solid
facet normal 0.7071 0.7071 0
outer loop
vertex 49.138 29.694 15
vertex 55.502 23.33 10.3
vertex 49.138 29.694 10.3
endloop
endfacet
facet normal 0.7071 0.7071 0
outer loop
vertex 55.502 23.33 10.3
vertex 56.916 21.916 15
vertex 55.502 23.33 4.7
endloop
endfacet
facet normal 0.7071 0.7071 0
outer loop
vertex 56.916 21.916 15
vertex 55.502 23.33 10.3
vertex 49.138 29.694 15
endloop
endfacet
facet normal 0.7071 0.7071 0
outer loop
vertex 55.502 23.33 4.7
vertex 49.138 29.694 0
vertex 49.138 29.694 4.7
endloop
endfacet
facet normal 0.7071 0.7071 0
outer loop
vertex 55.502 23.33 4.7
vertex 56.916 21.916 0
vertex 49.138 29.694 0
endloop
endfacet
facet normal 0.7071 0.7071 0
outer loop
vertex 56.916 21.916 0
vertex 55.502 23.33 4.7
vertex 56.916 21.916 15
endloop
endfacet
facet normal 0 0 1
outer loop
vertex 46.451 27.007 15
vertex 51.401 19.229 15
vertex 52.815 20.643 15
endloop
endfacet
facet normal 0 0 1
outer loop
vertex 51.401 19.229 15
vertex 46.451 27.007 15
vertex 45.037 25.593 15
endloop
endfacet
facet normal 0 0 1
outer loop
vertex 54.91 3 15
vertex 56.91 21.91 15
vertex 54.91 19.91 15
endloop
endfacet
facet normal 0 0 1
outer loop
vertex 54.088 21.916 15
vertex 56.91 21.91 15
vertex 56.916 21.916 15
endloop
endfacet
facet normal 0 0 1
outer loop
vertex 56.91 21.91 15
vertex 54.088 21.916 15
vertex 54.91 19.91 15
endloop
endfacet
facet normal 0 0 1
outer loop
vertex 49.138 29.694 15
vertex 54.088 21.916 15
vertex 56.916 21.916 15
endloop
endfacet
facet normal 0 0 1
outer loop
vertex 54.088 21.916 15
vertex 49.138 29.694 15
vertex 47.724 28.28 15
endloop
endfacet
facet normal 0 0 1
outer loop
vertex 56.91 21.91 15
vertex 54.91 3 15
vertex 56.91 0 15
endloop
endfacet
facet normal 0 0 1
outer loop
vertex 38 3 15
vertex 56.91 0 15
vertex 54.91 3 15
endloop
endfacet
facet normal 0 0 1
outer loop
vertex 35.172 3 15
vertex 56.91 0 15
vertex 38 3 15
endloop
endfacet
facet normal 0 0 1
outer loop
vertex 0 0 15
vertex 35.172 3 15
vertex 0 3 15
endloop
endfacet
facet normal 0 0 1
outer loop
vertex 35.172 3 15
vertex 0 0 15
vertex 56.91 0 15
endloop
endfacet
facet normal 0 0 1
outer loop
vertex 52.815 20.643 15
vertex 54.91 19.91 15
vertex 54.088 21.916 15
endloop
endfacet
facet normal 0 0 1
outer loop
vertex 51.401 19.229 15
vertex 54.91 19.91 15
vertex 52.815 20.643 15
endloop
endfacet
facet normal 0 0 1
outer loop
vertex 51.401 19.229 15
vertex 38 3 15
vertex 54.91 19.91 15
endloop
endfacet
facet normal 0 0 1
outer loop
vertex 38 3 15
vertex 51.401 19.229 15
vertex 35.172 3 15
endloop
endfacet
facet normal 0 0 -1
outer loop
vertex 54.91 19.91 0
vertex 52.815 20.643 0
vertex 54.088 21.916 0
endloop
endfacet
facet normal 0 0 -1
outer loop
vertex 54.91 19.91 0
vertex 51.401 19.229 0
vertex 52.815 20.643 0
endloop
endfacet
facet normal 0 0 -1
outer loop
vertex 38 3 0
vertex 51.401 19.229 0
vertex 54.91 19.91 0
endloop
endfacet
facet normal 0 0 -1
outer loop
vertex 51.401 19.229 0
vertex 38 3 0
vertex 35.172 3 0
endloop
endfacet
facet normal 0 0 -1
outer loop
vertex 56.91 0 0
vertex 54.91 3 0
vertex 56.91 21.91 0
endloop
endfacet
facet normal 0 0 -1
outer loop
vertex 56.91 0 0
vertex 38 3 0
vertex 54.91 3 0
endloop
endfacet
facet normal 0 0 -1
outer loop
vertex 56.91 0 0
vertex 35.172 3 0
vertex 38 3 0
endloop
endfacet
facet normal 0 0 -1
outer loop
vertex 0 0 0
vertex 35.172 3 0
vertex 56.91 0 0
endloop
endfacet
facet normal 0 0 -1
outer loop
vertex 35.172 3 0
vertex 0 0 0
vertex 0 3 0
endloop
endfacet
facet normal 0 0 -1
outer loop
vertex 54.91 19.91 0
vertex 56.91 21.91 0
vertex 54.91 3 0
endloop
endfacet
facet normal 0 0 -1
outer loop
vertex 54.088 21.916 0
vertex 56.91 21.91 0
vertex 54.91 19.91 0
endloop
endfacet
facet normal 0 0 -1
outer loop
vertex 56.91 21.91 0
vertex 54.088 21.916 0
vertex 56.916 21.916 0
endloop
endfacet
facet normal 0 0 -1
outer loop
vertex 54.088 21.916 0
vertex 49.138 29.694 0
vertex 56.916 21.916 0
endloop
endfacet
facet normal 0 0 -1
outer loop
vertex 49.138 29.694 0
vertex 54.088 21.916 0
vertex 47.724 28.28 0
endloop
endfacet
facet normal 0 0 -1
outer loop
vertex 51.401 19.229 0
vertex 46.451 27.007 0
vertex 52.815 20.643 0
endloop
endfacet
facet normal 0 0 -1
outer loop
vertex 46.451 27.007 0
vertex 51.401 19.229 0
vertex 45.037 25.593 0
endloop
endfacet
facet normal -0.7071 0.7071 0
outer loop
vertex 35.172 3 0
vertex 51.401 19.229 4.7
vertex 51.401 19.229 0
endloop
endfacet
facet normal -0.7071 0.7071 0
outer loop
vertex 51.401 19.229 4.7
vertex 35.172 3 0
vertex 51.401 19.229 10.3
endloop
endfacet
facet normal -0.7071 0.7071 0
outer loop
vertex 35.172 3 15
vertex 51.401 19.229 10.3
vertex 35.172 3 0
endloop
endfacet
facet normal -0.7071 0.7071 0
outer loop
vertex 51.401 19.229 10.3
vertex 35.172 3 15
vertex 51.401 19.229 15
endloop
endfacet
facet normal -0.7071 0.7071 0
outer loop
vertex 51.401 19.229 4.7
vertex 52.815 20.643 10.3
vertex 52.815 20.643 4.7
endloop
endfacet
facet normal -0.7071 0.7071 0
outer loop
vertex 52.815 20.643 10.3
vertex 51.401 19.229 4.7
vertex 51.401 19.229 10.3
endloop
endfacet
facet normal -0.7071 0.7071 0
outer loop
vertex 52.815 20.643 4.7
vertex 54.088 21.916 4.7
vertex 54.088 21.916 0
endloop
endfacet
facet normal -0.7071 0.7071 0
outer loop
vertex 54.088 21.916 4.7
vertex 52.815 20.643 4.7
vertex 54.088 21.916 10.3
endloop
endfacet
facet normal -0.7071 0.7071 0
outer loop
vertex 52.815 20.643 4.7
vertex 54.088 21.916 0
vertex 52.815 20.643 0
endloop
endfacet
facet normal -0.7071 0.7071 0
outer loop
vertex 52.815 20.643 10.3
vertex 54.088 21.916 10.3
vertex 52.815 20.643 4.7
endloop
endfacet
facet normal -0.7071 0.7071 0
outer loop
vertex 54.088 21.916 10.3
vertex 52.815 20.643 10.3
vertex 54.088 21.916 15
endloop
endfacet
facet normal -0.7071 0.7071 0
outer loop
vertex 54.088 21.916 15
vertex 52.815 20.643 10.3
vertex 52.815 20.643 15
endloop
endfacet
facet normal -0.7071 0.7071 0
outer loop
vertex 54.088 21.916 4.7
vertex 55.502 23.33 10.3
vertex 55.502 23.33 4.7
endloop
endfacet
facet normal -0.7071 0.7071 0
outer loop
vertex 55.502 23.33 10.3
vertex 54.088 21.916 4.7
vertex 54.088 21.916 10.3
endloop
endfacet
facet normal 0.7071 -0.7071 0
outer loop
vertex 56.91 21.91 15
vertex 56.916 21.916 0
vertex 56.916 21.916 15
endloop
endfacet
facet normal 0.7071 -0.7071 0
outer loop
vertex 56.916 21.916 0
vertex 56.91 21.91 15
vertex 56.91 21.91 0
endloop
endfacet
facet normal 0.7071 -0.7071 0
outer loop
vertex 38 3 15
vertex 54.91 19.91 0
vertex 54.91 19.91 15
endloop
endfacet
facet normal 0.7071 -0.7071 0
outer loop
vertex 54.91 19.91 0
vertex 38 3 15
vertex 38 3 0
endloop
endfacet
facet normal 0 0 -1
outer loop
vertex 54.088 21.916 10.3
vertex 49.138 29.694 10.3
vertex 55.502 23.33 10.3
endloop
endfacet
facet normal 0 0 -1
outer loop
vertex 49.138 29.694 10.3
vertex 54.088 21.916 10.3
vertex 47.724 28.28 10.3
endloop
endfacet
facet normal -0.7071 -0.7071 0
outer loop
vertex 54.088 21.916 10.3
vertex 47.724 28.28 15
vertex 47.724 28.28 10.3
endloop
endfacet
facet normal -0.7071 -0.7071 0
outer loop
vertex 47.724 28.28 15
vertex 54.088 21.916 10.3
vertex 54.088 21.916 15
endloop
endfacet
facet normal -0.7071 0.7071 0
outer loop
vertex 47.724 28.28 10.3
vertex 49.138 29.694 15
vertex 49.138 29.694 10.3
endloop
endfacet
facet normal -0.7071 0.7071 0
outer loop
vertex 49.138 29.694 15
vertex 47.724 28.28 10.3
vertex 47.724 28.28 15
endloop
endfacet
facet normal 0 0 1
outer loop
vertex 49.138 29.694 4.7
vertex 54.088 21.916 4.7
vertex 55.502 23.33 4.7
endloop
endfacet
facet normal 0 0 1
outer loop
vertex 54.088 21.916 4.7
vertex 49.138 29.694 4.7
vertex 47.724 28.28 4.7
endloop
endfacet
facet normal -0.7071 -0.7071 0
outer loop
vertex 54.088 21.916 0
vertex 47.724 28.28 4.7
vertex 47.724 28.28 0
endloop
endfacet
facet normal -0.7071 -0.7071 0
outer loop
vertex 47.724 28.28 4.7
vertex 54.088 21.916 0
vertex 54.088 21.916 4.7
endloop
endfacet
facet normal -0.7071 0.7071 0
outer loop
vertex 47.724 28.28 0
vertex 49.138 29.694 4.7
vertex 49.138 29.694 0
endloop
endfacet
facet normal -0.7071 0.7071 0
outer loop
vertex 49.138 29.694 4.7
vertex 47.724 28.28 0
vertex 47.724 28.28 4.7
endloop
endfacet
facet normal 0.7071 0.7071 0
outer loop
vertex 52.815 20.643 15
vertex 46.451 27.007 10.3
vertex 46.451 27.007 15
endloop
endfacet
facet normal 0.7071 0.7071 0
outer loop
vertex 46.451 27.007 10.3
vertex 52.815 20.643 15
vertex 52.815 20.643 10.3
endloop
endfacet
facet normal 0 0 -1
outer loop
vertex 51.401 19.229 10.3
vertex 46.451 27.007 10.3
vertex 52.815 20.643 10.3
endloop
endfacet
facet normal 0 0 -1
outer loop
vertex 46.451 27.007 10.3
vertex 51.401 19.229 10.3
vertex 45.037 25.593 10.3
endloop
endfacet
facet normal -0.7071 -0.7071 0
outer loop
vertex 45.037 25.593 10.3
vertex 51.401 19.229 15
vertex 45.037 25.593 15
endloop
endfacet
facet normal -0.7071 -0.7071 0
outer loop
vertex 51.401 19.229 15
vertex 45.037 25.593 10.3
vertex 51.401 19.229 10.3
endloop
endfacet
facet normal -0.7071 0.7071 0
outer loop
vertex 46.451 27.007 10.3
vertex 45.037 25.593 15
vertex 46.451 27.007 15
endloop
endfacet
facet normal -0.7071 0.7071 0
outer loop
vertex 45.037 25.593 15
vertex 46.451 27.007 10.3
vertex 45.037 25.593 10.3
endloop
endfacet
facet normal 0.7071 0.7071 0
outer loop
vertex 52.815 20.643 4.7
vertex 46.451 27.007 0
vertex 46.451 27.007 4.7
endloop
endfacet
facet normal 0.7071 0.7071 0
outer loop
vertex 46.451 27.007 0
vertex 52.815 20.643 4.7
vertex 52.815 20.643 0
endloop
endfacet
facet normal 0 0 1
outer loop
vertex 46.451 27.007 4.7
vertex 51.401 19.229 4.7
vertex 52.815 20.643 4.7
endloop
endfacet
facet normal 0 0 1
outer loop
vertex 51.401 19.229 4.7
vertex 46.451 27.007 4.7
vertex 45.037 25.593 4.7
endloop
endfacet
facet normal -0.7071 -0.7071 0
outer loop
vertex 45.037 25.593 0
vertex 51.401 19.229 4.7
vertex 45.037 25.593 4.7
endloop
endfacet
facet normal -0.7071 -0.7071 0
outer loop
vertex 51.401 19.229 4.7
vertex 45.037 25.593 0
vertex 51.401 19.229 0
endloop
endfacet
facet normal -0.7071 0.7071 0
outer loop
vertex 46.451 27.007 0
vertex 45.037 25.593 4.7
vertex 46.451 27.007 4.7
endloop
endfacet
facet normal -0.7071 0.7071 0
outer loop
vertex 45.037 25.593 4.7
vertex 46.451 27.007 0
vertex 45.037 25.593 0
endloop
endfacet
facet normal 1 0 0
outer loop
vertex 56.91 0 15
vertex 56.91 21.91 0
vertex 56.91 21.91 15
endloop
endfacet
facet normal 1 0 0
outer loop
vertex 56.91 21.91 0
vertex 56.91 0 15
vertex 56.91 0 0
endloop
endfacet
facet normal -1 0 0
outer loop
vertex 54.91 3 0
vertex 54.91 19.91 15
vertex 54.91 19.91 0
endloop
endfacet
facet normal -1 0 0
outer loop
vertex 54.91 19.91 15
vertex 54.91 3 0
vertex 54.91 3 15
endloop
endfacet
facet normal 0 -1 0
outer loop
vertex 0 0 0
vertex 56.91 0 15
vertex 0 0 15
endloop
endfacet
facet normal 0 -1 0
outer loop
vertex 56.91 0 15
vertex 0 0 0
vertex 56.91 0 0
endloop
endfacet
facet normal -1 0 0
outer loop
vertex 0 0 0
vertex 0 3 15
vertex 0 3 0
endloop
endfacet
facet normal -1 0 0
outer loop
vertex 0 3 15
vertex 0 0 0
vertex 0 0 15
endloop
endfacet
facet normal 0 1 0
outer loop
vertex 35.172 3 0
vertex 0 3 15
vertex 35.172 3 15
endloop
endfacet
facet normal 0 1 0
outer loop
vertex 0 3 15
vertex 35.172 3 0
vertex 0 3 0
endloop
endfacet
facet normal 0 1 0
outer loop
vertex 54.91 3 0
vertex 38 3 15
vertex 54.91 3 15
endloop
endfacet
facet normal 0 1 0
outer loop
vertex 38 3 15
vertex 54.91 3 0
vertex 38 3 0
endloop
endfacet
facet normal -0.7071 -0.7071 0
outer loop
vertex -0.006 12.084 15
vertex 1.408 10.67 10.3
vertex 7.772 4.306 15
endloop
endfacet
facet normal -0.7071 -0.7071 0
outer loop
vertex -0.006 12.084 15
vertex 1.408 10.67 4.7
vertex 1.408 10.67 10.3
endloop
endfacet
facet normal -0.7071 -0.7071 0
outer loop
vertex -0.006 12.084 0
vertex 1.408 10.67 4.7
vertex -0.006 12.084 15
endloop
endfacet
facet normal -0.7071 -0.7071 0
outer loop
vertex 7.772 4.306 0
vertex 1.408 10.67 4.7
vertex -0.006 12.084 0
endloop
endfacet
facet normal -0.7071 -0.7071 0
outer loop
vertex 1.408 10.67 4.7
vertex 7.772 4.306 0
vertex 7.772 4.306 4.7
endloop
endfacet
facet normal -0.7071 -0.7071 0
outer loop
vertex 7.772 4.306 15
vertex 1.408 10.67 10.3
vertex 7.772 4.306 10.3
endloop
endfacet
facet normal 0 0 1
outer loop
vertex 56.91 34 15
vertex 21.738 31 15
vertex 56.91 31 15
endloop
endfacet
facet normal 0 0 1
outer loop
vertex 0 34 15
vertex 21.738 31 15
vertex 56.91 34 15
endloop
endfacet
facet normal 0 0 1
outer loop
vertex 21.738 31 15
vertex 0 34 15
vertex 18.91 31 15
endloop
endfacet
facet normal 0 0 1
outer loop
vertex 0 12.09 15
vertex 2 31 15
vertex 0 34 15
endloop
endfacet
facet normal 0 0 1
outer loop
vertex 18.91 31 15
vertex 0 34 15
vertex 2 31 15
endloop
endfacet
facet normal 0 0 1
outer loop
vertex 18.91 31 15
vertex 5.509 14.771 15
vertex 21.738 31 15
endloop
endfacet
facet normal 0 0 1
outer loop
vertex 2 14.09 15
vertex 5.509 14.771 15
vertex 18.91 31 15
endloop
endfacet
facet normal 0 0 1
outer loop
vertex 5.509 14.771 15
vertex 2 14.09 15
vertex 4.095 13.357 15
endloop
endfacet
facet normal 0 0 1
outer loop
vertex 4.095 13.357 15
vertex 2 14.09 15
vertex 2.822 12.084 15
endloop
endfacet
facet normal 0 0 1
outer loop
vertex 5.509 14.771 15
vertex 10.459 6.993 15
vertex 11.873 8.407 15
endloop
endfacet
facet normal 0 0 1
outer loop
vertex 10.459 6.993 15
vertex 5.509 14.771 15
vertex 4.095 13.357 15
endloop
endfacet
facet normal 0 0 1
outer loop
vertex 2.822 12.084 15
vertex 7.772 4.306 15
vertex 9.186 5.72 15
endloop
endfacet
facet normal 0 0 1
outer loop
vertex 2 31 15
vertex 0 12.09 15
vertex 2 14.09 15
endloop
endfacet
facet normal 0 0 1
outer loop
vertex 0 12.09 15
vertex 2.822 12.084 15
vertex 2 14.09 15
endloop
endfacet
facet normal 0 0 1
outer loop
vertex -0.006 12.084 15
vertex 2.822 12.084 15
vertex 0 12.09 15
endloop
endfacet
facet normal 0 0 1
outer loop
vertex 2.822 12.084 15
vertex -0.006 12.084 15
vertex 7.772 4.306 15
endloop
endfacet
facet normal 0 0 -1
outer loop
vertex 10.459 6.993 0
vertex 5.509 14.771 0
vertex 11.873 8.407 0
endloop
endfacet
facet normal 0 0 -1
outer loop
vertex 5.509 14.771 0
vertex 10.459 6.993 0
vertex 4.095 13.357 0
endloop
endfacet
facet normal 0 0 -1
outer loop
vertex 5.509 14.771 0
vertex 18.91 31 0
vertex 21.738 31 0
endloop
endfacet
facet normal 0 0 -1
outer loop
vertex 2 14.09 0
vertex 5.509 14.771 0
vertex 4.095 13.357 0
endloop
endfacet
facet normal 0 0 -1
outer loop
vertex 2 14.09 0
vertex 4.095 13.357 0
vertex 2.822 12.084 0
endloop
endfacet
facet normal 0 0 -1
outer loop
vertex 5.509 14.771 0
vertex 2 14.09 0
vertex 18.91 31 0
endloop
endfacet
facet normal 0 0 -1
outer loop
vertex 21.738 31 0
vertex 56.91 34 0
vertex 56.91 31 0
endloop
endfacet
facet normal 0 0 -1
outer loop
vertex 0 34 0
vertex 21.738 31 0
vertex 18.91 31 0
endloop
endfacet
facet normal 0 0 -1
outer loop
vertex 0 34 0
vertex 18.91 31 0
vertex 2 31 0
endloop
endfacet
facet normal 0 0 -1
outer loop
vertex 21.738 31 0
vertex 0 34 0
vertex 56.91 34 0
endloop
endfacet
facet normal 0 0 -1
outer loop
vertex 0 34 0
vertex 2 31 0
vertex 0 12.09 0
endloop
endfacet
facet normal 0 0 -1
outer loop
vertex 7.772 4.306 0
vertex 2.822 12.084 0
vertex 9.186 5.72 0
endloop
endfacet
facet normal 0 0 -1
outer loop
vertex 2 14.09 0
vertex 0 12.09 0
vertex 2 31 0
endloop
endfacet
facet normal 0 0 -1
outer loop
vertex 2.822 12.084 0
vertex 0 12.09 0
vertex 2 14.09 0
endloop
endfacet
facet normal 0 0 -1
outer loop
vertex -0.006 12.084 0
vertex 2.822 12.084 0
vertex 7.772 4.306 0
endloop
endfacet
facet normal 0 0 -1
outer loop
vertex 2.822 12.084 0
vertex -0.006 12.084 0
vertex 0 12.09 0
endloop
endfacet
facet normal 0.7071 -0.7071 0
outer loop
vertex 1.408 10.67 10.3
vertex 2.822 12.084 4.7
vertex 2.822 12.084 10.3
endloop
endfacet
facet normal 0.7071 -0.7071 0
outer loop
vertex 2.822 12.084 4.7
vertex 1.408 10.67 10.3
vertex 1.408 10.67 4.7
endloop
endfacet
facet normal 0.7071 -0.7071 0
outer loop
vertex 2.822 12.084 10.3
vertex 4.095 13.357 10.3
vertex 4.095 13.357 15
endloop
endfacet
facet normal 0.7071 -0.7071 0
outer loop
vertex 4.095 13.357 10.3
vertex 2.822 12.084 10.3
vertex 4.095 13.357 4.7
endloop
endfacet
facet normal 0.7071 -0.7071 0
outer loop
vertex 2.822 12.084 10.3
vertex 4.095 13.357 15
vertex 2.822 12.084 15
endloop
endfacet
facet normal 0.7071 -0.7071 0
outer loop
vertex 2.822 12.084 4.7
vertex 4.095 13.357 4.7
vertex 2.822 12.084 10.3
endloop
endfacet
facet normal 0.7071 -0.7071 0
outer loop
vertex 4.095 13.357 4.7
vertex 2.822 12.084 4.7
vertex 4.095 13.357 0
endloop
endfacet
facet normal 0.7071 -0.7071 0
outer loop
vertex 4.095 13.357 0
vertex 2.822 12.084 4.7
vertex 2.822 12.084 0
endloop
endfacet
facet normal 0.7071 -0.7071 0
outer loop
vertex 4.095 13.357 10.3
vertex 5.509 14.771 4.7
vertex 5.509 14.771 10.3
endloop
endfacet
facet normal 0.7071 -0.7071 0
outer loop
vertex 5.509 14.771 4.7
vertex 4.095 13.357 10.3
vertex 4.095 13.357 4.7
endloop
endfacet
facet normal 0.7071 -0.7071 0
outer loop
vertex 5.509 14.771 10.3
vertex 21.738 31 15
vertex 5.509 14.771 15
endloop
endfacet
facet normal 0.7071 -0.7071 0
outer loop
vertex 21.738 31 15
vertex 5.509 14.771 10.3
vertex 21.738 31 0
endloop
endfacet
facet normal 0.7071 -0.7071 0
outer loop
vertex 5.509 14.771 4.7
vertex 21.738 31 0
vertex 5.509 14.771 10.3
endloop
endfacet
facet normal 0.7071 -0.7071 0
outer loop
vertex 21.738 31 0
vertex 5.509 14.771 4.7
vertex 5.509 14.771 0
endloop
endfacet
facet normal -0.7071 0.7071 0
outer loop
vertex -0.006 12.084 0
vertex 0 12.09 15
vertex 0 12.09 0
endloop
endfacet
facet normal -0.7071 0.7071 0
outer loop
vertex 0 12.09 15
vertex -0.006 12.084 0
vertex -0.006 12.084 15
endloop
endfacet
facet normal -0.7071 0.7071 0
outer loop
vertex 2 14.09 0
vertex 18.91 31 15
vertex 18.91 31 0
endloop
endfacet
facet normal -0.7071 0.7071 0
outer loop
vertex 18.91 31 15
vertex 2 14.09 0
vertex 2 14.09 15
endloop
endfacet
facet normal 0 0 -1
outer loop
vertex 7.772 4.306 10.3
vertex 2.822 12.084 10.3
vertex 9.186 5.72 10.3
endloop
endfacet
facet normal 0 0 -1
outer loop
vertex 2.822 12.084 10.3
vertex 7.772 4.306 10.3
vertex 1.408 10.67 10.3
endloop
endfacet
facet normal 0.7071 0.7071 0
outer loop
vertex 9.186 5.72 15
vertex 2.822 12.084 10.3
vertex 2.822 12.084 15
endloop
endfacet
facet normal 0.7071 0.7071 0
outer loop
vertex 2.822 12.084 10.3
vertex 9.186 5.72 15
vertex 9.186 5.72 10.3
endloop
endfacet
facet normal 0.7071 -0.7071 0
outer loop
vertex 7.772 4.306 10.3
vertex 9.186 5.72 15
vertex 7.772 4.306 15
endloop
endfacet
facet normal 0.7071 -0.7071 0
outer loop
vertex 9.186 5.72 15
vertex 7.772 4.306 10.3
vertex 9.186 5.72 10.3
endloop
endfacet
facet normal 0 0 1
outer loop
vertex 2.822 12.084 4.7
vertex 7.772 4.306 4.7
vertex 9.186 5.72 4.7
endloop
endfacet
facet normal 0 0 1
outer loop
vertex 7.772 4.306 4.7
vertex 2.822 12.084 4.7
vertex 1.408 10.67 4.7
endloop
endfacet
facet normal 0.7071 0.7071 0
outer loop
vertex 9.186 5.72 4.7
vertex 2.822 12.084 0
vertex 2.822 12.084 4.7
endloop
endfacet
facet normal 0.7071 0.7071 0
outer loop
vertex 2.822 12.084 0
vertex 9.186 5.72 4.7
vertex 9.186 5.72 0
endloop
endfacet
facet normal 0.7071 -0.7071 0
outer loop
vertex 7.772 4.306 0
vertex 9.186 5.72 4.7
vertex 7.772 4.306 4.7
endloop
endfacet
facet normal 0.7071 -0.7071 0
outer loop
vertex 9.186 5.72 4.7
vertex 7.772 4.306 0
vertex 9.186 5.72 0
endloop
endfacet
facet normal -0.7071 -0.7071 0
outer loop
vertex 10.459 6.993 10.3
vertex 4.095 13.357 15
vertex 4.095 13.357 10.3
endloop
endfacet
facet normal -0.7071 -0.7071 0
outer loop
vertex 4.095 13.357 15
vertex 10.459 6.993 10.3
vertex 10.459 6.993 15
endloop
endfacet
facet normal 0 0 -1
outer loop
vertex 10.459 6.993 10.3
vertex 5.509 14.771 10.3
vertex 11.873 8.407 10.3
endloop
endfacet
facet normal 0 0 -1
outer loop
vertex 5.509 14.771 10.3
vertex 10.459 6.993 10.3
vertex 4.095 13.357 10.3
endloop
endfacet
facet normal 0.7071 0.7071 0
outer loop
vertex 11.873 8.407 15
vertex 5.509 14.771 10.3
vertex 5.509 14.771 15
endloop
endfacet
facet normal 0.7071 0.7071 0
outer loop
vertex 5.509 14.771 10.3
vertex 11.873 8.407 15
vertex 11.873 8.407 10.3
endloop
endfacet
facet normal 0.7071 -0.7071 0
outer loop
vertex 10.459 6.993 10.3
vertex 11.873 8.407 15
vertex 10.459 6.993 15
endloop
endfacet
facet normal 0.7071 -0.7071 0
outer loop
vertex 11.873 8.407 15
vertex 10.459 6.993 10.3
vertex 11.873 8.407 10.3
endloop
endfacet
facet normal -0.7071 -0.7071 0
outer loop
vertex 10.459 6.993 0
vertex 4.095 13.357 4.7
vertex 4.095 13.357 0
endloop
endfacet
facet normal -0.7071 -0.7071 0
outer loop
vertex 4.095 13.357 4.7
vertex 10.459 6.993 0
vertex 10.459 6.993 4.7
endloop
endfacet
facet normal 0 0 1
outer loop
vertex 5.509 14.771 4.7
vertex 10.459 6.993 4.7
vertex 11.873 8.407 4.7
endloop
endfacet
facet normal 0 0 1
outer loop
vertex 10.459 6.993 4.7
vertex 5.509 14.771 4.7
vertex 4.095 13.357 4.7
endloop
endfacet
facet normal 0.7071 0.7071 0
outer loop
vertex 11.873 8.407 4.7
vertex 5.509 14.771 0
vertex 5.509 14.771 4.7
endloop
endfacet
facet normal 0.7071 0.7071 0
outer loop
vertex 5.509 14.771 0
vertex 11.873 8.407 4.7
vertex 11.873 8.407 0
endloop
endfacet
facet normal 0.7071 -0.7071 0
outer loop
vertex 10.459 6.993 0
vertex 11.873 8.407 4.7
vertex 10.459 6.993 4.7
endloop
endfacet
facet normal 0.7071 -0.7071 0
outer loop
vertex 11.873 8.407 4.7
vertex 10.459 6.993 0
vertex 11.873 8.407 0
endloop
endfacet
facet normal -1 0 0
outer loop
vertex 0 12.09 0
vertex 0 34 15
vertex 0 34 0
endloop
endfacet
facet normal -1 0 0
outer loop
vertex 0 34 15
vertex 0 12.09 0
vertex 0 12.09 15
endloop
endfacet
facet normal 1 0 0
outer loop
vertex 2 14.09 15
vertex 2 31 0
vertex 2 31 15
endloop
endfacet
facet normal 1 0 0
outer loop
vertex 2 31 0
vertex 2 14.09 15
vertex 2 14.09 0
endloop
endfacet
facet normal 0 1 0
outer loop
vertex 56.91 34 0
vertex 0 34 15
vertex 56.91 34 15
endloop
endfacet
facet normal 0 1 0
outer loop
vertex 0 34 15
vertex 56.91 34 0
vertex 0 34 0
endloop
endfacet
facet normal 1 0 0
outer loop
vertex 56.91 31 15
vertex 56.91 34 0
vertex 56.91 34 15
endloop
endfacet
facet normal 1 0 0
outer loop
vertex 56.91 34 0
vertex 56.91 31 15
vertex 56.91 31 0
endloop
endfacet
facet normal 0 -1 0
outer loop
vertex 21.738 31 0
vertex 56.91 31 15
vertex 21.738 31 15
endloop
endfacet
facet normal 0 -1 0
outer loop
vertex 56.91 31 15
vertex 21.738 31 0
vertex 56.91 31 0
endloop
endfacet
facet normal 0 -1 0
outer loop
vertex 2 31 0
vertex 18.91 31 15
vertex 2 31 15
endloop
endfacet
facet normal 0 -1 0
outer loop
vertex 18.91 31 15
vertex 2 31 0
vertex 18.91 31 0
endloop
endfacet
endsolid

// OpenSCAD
/**
  * This code is published under a
  * Creative Commons Attribution-NonCommercial-ShareAlike 3.0
  * licence, please respect it.
  */

module holder() {
    translate([36.41, 1.41, 0]) rotate([0, 0, 45]) {
                                   cube([29, 2, 15]);  // 45° beam
        translate([27,   2, 10.3]) cube([2,  9, 4.7]); // left upper finger
        translate([27,   2, 0])    cube([2,  9, 4.7]); // right upper finger
        translate([23.2, 2, 10.3]) cube([2,  9, 4.7]); // left lower finger
        translate([23.2, 2, 0])    cube([2,  9, 4.7]); // right lower finger
    }
    translate([54.91, 0, 0]) cube([2,     21.91, 15]); // vertical beam
                             cube([56.91, 3,     15]); // base
}

holder();
translate([56.91, 34, 0]) rotate([0, 0, 180]) holder();
